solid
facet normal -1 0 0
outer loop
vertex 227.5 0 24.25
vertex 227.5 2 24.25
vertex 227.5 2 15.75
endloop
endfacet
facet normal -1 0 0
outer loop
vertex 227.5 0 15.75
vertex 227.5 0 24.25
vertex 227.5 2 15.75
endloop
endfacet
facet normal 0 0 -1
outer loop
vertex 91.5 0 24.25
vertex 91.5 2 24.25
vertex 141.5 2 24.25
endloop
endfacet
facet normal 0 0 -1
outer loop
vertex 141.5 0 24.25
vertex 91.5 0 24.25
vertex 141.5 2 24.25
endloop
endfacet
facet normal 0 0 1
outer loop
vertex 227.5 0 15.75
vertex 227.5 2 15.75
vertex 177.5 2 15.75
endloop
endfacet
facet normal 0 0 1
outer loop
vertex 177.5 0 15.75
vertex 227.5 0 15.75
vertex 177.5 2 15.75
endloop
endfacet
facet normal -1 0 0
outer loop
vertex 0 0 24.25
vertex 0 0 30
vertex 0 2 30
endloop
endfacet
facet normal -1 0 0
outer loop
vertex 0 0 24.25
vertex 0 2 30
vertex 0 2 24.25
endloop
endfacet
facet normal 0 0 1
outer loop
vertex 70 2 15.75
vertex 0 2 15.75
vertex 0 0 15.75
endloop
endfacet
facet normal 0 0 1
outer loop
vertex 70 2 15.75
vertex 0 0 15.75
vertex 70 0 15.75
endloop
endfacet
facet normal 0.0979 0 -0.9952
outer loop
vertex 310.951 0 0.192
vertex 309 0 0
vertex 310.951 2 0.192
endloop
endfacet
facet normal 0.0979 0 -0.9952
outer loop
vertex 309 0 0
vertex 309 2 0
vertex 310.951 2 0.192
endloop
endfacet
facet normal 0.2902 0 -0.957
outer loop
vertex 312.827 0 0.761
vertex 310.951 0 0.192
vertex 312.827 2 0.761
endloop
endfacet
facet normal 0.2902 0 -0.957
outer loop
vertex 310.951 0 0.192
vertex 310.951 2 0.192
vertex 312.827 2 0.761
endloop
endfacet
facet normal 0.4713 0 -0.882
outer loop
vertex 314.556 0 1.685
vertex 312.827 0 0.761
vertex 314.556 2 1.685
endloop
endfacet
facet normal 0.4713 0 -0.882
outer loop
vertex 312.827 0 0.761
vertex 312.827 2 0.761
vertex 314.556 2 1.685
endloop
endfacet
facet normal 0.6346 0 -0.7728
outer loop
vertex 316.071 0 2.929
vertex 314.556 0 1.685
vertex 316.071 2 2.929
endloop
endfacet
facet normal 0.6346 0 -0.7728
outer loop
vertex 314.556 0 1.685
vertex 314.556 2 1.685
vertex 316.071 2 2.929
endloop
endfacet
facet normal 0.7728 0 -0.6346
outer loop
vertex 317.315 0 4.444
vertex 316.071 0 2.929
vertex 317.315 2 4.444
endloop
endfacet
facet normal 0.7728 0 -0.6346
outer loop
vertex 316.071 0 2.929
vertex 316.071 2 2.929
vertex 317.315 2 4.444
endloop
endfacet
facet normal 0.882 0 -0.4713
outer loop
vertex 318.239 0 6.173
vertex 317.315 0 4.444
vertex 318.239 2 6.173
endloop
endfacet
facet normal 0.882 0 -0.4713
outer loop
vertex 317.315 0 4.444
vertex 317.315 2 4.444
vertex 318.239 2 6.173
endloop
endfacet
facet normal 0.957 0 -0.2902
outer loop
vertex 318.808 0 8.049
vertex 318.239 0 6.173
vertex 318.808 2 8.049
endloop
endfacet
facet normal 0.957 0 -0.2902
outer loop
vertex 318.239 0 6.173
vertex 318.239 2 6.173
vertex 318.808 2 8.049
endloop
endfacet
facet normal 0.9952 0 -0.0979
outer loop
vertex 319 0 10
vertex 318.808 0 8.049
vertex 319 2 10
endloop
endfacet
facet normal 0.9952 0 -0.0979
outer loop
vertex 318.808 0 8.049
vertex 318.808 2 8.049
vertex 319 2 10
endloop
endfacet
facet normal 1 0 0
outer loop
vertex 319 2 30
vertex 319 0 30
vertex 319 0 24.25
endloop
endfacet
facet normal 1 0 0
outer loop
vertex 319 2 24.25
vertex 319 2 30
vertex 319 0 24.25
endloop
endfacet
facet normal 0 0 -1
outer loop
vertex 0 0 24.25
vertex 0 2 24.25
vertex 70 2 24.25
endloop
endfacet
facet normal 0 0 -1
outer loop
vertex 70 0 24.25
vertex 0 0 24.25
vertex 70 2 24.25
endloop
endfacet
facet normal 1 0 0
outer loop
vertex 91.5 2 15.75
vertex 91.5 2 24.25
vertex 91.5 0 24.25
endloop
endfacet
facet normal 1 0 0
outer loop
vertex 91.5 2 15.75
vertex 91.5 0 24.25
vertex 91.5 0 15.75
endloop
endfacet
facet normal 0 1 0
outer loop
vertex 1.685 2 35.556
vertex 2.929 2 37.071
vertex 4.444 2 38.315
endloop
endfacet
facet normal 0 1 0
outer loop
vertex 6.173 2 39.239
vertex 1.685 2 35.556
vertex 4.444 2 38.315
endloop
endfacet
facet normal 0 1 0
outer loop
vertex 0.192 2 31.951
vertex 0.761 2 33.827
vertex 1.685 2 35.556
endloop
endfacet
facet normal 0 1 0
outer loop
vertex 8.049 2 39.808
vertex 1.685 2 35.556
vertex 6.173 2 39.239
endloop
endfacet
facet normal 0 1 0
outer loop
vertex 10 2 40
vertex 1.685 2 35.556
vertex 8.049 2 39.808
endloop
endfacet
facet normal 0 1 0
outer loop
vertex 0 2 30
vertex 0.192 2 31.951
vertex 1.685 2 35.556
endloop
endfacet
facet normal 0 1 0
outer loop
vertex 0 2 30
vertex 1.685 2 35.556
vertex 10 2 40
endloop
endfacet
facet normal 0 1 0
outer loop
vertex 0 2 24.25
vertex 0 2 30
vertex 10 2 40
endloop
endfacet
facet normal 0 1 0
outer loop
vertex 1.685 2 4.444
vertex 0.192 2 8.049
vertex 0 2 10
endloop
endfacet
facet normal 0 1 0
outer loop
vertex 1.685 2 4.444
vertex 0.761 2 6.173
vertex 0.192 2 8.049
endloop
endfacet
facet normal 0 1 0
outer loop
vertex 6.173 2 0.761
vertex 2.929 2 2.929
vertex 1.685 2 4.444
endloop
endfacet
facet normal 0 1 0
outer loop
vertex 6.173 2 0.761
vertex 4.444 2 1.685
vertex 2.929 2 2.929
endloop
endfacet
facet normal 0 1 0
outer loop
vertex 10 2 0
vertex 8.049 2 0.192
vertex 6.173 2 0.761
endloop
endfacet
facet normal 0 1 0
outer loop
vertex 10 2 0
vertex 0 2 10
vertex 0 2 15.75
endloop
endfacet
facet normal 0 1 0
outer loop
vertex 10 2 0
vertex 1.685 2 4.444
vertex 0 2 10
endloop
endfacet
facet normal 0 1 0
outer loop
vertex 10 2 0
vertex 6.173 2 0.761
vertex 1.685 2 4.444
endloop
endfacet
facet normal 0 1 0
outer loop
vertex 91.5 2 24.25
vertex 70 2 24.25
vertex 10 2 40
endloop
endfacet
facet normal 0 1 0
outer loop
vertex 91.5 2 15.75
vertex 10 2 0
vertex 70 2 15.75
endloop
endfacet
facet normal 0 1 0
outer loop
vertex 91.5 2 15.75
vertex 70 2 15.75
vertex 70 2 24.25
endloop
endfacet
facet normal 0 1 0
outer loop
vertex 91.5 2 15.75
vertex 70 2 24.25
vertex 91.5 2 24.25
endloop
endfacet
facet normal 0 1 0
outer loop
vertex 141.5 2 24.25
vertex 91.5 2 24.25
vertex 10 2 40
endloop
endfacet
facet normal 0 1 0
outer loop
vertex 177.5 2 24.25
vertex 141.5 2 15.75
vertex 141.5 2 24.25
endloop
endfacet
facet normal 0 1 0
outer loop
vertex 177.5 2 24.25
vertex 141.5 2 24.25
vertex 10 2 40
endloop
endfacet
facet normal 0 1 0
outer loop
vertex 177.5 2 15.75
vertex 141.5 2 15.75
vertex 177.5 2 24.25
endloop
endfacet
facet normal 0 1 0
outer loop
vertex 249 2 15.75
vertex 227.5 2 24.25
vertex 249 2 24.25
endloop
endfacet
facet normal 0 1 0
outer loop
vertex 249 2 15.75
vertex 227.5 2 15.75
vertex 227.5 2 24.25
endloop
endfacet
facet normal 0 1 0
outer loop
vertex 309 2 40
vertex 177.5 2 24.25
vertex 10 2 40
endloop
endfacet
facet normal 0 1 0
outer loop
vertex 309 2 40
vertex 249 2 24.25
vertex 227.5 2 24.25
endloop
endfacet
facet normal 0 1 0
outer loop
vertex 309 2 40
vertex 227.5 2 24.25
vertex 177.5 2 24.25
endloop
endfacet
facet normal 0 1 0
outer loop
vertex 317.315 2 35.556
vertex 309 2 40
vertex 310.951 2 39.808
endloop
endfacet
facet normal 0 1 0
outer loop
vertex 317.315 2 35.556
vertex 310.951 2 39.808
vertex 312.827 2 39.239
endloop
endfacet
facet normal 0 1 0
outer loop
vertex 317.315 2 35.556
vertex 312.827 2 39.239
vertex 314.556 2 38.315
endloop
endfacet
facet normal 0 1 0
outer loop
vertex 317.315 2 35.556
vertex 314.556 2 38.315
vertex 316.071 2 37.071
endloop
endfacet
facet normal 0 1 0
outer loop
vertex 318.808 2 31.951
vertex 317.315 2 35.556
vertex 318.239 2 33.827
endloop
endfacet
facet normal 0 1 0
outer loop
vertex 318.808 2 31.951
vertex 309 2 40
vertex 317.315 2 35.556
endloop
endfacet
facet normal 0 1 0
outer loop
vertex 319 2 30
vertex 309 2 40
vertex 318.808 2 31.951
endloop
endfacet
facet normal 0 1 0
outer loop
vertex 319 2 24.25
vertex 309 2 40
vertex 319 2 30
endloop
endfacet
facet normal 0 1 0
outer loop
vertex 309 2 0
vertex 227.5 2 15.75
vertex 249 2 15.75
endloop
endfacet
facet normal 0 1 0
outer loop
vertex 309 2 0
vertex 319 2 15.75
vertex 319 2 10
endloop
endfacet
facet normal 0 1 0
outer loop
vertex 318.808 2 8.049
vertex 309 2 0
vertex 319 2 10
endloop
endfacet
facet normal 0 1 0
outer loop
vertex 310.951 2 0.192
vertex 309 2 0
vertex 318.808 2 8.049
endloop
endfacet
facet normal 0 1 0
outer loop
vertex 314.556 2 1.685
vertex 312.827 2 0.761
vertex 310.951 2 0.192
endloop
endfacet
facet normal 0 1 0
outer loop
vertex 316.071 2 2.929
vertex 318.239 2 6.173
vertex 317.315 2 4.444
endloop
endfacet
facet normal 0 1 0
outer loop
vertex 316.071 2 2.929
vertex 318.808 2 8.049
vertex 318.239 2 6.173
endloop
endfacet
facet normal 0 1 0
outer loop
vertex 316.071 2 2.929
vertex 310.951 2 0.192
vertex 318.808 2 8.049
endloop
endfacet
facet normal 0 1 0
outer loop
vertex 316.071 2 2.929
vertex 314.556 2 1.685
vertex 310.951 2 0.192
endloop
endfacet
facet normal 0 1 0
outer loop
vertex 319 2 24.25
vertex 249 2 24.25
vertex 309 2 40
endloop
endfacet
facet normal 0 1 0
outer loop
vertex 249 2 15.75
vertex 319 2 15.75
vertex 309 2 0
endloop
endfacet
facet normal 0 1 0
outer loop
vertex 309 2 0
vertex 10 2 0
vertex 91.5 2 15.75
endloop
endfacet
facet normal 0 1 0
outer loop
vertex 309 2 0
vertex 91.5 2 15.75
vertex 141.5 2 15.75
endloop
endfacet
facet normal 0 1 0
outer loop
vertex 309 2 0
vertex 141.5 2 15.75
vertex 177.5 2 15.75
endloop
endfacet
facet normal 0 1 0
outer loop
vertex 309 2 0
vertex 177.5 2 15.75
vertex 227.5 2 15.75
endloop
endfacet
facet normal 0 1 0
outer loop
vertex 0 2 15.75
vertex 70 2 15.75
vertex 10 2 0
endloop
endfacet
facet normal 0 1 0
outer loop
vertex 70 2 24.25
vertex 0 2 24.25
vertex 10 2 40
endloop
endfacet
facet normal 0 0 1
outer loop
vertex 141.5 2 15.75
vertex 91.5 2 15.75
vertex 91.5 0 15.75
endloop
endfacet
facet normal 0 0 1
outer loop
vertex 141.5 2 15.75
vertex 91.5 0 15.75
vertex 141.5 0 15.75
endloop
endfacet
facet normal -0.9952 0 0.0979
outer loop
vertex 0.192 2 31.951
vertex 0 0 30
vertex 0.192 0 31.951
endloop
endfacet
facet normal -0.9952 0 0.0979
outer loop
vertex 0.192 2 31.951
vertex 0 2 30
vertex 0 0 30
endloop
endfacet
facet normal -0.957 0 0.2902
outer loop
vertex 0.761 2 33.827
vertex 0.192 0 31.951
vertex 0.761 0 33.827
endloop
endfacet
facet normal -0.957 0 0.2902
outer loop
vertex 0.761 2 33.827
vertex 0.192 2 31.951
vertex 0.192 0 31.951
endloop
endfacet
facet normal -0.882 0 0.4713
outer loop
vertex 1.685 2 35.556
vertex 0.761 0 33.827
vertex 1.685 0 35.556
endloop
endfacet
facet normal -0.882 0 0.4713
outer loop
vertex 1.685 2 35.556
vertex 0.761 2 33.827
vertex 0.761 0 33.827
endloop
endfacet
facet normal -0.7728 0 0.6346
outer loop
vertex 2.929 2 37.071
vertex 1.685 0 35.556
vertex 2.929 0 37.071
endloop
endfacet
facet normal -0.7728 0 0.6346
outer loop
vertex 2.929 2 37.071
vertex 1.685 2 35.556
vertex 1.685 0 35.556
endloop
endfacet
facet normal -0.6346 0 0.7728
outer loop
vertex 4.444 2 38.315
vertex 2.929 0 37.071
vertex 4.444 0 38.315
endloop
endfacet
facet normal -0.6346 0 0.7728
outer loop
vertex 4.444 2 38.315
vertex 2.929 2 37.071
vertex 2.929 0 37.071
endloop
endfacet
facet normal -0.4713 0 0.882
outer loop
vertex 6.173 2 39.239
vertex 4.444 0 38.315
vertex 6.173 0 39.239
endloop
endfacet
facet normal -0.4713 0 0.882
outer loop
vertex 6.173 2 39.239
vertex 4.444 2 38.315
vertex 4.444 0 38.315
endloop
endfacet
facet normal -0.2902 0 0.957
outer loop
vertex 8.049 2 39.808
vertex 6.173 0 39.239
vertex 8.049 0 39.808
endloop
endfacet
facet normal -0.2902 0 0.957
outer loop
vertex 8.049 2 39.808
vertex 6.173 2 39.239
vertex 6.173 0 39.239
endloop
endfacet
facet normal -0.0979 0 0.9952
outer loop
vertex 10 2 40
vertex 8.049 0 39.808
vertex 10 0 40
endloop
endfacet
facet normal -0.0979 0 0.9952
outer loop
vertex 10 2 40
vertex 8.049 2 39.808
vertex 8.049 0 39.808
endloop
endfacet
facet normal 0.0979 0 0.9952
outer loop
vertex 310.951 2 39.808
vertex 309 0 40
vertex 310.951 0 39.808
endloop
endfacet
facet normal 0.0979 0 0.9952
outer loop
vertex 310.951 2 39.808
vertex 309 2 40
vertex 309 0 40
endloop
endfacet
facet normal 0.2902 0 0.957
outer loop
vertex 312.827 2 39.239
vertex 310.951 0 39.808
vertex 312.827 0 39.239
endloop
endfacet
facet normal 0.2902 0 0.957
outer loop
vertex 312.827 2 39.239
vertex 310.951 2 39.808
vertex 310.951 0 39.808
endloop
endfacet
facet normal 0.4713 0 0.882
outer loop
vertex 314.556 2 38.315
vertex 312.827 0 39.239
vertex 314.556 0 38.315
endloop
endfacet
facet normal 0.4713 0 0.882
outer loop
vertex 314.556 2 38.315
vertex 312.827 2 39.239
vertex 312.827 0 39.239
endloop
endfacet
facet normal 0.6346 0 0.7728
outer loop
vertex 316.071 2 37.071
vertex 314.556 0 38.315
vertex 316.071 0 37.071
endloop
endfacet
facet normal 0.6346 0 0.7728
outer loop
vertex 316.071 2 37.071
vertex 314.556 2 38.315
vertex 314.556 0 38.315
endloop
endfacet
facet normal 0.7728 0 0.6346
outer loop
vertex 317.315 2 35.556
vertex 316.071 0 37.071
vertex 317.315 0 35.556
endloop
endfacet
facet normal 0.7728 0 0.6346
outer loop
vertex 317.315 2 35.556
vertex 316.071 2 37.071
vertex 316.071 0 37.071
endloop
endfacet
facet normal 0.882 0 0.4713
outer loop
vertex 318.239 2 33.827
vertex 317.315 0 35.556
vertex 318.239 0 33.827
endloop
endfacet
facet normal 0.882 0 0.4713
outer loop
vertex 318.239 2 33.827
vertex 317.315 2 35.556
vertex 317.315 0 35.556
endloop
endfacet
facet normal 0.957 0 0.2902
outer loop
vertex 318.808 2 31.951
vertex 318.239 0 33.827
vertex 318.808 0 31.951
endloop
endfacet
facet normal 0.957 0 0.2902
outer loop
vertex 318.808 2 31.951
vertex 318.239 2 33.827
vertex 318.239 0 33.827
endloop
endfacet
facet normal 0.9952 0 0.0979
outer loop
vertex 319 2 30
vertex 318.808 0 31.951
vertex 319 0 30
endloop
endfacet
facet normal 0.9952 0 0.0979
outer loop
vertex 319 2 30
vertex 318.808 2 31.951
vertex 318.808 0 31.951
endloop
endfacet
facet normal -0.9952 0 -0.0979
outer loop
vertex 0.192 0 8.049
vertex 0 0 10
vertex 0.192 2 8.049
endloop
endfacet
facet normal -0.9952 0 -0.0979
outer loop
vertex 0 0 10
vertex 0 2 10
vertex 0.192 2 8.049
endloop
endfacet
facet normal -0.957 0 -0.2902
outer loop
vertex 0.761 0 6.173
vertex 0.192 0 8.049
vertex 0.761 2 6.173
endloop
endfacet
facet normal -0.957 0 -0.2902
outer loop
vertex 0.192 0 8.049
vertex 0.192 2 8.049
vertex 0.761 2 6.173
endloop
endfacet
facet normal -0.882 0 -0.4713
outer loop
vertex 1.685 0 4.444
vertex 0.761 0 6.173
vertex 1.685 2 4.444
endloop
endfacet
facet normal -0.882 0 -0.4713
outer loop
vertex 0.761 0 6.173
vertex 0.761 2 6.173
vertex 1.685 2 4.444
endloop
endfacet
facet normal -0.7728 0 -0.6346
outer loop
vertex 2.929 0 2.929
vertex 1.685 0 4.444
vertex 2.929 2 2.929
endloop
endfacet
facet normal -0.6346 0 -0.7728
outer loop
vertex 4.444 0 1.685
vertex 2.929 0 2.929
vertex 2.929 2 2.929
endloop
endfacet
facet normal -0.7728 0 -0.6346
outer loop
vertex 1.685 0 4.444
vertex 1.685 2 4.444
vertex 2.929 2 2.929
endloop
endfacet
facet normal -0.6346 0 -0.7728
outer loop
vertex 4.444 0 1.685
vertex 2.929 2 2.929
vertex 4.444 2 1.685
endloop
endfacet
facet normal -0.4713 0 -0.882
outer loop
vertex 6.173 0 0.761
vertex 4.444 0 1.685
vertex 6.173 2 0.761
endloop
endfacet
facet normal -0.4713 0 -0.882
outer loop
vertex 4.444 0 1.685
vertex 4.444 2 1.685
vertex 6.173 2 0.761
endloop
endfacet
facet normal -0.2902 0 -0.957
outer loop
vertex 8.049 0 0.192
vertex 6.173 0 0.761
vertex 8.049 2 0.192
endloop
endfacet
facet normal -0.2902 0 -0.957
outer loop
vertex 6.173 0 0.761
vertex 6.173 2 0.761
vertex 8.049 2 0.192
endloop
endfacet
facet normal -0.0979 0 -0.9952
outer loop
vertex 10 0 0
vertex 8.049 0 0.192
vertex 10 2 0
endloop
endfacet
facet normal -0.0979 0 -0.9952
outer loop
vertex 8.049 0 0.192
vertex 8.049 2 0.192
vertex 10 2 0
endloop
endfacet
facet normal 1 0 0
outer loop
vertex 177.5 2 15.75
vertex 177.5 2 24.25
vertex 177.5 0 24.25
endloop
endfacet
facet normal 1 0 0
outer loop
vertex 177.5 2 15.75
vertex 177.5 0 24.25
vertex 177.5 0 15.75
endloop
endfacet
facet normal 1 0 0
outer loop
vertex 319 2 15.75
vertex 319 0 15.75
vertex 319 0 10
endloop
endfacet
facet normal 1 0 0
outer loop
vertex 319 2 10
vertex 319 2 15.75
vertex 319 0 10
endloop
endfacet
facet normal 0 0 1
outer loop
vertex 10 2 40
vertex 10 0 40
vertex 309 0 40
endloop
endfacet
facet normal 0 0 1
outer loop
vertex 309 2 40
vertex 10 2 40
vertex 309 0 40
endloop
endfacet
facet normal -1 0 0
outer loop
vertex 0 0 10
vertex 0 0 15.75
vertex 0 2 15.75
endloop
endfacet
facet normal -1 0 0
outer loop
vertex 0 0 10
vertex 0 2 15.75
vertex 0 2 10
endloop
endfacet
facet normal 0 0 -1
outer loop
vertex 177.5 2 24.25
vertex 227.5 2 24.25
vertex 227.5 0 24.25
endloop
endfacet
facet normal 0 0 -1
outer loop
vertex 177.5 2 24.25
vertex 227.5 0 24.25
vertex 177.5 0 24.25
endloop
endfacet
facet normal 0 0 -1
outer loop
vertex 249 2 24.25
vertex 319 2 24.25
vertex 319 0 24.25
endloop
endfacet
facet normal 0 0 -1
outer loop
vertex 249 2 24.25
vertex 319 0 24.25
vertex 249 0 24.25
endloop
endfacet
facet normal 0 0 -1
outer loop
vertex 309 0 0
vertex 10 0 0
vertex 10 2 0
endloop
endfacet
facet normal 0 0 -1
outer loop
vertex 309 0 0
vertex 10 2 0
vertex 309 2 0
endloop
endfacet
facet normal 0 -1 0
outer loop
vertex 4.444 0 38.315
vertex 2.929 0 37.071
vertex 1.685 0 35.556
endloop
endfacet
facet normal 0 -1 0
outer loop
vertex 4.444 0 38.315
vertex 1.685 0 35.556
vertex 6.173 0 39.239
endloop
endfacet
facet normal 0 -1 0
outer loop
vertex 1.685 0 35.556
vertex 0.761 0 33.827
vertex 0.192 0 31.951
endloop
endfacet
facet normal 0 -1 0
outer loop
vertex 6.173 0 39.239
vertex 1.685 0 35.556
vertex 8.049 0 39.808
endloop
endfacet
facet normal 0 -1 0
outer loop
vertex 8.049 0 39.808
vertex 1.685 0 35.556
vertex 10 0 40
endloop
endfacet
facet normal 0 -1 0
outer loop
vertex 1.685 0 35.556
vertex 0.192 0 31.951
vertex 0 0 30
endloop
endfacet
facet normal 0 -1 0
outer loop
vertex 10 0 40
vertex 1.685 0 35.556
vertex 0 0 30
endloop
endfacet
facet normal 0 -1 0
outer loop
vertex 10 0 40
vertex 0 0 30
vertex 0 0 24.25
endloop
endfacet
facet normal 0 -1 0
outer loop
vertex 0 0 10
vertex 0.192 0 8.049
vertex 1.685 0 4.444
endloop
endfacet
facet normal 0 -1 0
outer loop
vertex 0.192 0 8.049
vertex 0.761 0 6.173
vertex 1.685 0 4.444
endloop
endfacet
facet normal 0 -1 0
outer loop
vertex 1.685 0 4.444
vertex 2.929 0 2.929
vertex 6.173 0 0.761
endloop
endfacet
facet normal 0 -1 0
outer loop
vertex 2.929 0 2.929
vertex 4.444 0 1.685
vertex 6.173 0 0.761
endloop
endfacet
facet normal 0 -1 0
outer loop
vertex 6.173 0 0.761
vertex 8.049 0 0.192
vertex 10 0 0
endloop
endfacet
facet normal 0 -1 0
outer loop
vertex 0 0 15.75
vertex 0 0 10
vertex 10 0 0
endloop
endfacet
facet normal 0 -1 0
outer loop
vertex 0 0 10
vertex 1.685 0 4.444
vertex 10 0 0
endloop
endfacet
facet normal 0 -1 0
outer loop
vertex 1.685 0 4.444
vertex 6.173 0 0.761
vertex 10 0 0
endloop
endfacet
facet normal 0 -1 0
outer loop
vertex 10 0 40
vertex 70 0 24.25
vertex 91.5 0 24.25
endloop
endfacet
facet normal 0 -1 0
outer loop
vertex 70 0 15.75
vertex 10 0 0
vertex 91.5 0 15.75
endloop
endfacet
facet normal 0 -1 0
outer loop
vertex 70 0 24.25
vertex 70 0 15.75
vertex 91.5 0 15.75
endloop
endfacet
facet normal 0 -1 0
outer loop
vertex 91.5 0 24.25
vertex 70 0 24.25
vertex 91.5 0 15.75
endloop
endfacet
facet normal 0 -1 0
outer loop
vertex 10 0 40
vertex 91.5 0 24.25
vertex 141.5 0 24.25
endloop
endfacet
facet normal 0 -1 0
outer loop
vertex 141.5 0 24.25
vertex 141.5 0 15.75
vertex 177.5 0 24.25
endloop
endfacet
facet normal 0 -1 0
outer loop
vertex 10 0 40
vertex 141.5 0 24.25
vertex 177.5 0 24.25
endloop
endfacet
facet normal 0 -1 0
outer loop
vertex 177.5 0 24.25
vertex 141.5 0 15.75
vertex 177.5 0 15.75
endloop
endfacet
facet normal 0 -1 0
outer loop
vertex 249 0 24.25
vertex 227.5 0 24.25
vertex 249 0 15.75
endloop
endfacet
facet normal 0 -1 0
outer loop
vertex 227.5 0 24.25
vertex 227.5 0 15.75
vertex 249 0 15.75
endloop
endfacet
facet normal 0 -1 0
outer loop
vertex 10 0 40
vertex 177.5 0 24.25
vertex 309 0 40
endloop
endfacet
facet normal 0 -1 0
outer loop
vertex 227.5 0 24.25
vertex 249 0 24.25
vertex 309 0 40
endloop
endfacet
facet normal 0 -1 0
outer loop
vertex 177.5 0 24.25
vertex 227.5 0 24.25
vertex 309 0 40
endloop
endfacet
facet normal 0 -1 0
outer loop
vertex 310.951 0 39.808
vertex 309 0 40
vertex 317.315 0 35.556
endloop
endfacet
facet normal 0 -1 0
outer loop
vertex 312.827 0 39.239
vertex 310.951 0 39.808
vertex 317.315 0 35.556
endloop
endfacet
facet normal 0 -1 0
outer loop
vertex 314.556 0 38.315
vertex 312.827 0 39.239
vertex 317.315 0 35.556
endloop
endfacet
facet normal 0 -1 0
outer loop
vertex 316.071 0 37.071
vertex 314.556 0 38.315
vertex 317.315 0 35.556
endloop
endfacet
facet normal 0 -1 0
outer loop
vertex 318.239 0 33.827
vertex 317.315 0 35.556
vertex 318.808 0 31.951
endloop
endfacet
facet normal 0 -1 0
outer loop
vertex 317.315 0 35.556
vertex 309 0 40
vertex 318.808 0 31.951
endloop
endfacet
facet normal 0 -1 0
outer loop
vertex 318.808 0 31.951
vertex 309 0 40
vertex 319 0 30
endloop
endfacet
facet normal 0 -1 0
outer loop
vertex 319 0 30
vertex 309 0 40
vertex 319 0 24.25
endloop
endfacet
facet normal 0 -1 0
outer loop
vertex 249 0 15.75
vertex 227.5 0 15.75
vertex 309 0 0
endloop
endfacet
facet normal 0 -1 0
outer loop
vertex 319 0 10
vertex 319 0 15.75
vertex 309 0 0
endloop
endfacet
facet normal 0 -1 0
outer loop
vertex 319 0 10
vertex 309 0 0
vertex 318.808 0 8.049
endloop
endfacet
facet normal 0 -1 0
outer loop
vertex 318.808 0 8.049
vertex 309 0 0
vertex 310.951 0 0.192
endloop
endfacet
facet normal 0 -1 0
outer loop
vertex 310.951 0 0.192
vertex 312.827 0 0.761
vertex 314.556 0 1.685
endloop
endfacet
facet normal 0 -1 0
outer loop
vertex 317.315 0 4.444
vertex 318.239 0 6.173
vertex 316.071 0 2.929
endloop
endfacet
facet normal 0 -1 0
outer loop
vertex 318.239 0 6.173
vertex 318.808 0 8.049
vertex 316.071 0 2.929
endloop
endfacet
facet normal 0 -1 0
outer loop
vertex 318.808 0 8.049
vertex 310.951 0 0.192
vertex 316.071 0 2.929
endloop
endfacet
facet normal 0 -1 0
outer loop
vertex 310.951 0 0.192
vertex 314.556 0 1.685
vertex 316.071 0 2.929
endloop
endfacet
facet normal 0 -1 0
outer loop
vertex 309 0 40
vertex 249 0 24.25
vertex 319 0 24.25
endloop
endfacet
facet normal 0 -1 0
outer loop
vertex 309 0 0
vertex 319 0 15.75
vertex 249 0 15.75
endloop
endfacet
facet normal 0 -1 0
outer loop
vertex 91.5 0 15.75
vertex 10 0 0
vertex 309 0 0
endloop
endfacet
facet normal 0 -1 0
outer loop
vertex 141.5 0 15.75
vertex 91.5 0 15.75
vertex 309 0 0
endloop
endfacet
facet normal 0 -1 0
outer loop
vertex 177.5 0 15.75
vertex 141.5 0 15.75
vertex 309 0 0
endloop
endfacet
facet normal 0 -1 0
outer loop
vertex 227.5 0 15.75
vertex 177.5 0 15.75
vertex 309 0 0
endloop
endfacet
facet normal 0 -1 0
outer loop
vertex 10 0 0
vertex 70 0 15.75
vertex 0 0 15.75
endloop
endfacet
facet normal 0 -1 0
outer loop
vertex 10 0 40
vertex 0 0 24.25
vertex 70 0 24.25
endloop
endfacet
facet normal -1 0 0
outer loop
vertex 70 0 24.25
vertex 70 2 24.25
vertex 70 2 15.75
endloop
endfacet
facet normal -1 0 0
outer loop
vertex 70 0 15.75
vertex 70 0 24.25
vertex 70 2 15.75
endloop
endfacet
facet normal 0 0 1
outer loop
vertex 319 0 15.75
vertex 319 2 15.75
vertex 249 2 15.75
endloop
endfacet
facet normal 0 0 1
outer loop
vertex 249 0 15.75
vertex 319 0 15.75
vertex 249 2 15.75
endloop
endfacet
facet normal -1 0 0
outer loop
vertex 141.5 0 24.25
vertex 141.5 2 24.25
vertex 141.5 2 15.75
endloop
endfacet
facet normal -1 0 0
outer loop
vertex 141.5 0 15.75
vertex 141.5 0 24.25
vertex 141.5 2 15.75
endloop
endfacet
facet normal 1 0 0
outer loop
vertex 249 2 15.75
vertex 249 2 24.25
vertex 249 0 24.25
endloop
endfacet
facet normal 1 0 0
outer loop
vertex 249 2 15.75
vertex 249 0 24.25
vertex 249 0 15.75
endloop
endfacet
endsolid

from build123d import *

# Parameters (mm, degrees)
SKETCH1_W           = 319
SKETCH1_H           = 40
BOSS_EXTRUDE1_DEPTH = 2
SKETCH2_W           = 70
SKETCH2_H           = 8.5
CUT_EXTRUDE1_DEPTH  = 3
SKETCH3_W           = 50
SKETCH3_H           = 8.5
CUT_EXTRUDE2_DEPTH  = 3
FILLET1_R           = 10


with BuildPart() as part:
    # Sketch1 → Boss-Extrude1 (new body)
    with BuildSketch(Plane(origin=(0, 0, 0), x_dir=(1, 0, 0), z_dir=(0, 1, 0))):
        with Locations((159.5, -20)):
            Rectangle(SKETCH1_W, SKETCH1_H)
    extrude(amount=BOSS_EXTRUDE1_DEPTH)

    # Sketch2 → Cut-Extrude1 (cut, through all)
    with BuildSketch(Plane(origin=(0, 2, 0), x_dir=(1, 0, 0), z_dir=(0, 1, 0))):
        with Locations((35, -20)):
            Rectangle(SKETCH2_W, SKETCH2_H)
    cut_extrude1 = extrude(amount=-CUT_EXTRUDE1_DEPTH, mode=Mode.SUBTRACT)

    # Sketch3 → Cut-Extrude2 (cut, through all)
    with BuildSketch(Plane(origin=(0, 2, 0), x_dir=(1, 0, 0), z_dir=(0, 1, 0))):
        with Locations((116.5, -20)):
            Rectangle(SKETCH3_W, SKETCH3_H)
    cut_extrude2 = extrude(amount=-CUT_EXTRUDE2_DEPTH, mode=Mode.SUBTRACT)

    # Mirror1: Cut-Extrude1, Cut-Extrude2 across plane
    add(cut_extrude1.mirror(Plane.ZY.offset(-159.5)), mode=Mode.SUBTRACT)
    add(cut_extrude2.mirror(Plane.ZY.offset(-159.5)), mode=Mode.SUBTRACT)

    # Fillet1
    fillet1_edges = [part.edges().sort_by_distance(p)[0] for p in [
        (0, 1, 0),
        (319, 1, 0),
        (319, 1, 40),
        (0, 1, 40),
    ]]
    fillet(fillet1_edges, radius=FILLET1_R)


solid = part.part
